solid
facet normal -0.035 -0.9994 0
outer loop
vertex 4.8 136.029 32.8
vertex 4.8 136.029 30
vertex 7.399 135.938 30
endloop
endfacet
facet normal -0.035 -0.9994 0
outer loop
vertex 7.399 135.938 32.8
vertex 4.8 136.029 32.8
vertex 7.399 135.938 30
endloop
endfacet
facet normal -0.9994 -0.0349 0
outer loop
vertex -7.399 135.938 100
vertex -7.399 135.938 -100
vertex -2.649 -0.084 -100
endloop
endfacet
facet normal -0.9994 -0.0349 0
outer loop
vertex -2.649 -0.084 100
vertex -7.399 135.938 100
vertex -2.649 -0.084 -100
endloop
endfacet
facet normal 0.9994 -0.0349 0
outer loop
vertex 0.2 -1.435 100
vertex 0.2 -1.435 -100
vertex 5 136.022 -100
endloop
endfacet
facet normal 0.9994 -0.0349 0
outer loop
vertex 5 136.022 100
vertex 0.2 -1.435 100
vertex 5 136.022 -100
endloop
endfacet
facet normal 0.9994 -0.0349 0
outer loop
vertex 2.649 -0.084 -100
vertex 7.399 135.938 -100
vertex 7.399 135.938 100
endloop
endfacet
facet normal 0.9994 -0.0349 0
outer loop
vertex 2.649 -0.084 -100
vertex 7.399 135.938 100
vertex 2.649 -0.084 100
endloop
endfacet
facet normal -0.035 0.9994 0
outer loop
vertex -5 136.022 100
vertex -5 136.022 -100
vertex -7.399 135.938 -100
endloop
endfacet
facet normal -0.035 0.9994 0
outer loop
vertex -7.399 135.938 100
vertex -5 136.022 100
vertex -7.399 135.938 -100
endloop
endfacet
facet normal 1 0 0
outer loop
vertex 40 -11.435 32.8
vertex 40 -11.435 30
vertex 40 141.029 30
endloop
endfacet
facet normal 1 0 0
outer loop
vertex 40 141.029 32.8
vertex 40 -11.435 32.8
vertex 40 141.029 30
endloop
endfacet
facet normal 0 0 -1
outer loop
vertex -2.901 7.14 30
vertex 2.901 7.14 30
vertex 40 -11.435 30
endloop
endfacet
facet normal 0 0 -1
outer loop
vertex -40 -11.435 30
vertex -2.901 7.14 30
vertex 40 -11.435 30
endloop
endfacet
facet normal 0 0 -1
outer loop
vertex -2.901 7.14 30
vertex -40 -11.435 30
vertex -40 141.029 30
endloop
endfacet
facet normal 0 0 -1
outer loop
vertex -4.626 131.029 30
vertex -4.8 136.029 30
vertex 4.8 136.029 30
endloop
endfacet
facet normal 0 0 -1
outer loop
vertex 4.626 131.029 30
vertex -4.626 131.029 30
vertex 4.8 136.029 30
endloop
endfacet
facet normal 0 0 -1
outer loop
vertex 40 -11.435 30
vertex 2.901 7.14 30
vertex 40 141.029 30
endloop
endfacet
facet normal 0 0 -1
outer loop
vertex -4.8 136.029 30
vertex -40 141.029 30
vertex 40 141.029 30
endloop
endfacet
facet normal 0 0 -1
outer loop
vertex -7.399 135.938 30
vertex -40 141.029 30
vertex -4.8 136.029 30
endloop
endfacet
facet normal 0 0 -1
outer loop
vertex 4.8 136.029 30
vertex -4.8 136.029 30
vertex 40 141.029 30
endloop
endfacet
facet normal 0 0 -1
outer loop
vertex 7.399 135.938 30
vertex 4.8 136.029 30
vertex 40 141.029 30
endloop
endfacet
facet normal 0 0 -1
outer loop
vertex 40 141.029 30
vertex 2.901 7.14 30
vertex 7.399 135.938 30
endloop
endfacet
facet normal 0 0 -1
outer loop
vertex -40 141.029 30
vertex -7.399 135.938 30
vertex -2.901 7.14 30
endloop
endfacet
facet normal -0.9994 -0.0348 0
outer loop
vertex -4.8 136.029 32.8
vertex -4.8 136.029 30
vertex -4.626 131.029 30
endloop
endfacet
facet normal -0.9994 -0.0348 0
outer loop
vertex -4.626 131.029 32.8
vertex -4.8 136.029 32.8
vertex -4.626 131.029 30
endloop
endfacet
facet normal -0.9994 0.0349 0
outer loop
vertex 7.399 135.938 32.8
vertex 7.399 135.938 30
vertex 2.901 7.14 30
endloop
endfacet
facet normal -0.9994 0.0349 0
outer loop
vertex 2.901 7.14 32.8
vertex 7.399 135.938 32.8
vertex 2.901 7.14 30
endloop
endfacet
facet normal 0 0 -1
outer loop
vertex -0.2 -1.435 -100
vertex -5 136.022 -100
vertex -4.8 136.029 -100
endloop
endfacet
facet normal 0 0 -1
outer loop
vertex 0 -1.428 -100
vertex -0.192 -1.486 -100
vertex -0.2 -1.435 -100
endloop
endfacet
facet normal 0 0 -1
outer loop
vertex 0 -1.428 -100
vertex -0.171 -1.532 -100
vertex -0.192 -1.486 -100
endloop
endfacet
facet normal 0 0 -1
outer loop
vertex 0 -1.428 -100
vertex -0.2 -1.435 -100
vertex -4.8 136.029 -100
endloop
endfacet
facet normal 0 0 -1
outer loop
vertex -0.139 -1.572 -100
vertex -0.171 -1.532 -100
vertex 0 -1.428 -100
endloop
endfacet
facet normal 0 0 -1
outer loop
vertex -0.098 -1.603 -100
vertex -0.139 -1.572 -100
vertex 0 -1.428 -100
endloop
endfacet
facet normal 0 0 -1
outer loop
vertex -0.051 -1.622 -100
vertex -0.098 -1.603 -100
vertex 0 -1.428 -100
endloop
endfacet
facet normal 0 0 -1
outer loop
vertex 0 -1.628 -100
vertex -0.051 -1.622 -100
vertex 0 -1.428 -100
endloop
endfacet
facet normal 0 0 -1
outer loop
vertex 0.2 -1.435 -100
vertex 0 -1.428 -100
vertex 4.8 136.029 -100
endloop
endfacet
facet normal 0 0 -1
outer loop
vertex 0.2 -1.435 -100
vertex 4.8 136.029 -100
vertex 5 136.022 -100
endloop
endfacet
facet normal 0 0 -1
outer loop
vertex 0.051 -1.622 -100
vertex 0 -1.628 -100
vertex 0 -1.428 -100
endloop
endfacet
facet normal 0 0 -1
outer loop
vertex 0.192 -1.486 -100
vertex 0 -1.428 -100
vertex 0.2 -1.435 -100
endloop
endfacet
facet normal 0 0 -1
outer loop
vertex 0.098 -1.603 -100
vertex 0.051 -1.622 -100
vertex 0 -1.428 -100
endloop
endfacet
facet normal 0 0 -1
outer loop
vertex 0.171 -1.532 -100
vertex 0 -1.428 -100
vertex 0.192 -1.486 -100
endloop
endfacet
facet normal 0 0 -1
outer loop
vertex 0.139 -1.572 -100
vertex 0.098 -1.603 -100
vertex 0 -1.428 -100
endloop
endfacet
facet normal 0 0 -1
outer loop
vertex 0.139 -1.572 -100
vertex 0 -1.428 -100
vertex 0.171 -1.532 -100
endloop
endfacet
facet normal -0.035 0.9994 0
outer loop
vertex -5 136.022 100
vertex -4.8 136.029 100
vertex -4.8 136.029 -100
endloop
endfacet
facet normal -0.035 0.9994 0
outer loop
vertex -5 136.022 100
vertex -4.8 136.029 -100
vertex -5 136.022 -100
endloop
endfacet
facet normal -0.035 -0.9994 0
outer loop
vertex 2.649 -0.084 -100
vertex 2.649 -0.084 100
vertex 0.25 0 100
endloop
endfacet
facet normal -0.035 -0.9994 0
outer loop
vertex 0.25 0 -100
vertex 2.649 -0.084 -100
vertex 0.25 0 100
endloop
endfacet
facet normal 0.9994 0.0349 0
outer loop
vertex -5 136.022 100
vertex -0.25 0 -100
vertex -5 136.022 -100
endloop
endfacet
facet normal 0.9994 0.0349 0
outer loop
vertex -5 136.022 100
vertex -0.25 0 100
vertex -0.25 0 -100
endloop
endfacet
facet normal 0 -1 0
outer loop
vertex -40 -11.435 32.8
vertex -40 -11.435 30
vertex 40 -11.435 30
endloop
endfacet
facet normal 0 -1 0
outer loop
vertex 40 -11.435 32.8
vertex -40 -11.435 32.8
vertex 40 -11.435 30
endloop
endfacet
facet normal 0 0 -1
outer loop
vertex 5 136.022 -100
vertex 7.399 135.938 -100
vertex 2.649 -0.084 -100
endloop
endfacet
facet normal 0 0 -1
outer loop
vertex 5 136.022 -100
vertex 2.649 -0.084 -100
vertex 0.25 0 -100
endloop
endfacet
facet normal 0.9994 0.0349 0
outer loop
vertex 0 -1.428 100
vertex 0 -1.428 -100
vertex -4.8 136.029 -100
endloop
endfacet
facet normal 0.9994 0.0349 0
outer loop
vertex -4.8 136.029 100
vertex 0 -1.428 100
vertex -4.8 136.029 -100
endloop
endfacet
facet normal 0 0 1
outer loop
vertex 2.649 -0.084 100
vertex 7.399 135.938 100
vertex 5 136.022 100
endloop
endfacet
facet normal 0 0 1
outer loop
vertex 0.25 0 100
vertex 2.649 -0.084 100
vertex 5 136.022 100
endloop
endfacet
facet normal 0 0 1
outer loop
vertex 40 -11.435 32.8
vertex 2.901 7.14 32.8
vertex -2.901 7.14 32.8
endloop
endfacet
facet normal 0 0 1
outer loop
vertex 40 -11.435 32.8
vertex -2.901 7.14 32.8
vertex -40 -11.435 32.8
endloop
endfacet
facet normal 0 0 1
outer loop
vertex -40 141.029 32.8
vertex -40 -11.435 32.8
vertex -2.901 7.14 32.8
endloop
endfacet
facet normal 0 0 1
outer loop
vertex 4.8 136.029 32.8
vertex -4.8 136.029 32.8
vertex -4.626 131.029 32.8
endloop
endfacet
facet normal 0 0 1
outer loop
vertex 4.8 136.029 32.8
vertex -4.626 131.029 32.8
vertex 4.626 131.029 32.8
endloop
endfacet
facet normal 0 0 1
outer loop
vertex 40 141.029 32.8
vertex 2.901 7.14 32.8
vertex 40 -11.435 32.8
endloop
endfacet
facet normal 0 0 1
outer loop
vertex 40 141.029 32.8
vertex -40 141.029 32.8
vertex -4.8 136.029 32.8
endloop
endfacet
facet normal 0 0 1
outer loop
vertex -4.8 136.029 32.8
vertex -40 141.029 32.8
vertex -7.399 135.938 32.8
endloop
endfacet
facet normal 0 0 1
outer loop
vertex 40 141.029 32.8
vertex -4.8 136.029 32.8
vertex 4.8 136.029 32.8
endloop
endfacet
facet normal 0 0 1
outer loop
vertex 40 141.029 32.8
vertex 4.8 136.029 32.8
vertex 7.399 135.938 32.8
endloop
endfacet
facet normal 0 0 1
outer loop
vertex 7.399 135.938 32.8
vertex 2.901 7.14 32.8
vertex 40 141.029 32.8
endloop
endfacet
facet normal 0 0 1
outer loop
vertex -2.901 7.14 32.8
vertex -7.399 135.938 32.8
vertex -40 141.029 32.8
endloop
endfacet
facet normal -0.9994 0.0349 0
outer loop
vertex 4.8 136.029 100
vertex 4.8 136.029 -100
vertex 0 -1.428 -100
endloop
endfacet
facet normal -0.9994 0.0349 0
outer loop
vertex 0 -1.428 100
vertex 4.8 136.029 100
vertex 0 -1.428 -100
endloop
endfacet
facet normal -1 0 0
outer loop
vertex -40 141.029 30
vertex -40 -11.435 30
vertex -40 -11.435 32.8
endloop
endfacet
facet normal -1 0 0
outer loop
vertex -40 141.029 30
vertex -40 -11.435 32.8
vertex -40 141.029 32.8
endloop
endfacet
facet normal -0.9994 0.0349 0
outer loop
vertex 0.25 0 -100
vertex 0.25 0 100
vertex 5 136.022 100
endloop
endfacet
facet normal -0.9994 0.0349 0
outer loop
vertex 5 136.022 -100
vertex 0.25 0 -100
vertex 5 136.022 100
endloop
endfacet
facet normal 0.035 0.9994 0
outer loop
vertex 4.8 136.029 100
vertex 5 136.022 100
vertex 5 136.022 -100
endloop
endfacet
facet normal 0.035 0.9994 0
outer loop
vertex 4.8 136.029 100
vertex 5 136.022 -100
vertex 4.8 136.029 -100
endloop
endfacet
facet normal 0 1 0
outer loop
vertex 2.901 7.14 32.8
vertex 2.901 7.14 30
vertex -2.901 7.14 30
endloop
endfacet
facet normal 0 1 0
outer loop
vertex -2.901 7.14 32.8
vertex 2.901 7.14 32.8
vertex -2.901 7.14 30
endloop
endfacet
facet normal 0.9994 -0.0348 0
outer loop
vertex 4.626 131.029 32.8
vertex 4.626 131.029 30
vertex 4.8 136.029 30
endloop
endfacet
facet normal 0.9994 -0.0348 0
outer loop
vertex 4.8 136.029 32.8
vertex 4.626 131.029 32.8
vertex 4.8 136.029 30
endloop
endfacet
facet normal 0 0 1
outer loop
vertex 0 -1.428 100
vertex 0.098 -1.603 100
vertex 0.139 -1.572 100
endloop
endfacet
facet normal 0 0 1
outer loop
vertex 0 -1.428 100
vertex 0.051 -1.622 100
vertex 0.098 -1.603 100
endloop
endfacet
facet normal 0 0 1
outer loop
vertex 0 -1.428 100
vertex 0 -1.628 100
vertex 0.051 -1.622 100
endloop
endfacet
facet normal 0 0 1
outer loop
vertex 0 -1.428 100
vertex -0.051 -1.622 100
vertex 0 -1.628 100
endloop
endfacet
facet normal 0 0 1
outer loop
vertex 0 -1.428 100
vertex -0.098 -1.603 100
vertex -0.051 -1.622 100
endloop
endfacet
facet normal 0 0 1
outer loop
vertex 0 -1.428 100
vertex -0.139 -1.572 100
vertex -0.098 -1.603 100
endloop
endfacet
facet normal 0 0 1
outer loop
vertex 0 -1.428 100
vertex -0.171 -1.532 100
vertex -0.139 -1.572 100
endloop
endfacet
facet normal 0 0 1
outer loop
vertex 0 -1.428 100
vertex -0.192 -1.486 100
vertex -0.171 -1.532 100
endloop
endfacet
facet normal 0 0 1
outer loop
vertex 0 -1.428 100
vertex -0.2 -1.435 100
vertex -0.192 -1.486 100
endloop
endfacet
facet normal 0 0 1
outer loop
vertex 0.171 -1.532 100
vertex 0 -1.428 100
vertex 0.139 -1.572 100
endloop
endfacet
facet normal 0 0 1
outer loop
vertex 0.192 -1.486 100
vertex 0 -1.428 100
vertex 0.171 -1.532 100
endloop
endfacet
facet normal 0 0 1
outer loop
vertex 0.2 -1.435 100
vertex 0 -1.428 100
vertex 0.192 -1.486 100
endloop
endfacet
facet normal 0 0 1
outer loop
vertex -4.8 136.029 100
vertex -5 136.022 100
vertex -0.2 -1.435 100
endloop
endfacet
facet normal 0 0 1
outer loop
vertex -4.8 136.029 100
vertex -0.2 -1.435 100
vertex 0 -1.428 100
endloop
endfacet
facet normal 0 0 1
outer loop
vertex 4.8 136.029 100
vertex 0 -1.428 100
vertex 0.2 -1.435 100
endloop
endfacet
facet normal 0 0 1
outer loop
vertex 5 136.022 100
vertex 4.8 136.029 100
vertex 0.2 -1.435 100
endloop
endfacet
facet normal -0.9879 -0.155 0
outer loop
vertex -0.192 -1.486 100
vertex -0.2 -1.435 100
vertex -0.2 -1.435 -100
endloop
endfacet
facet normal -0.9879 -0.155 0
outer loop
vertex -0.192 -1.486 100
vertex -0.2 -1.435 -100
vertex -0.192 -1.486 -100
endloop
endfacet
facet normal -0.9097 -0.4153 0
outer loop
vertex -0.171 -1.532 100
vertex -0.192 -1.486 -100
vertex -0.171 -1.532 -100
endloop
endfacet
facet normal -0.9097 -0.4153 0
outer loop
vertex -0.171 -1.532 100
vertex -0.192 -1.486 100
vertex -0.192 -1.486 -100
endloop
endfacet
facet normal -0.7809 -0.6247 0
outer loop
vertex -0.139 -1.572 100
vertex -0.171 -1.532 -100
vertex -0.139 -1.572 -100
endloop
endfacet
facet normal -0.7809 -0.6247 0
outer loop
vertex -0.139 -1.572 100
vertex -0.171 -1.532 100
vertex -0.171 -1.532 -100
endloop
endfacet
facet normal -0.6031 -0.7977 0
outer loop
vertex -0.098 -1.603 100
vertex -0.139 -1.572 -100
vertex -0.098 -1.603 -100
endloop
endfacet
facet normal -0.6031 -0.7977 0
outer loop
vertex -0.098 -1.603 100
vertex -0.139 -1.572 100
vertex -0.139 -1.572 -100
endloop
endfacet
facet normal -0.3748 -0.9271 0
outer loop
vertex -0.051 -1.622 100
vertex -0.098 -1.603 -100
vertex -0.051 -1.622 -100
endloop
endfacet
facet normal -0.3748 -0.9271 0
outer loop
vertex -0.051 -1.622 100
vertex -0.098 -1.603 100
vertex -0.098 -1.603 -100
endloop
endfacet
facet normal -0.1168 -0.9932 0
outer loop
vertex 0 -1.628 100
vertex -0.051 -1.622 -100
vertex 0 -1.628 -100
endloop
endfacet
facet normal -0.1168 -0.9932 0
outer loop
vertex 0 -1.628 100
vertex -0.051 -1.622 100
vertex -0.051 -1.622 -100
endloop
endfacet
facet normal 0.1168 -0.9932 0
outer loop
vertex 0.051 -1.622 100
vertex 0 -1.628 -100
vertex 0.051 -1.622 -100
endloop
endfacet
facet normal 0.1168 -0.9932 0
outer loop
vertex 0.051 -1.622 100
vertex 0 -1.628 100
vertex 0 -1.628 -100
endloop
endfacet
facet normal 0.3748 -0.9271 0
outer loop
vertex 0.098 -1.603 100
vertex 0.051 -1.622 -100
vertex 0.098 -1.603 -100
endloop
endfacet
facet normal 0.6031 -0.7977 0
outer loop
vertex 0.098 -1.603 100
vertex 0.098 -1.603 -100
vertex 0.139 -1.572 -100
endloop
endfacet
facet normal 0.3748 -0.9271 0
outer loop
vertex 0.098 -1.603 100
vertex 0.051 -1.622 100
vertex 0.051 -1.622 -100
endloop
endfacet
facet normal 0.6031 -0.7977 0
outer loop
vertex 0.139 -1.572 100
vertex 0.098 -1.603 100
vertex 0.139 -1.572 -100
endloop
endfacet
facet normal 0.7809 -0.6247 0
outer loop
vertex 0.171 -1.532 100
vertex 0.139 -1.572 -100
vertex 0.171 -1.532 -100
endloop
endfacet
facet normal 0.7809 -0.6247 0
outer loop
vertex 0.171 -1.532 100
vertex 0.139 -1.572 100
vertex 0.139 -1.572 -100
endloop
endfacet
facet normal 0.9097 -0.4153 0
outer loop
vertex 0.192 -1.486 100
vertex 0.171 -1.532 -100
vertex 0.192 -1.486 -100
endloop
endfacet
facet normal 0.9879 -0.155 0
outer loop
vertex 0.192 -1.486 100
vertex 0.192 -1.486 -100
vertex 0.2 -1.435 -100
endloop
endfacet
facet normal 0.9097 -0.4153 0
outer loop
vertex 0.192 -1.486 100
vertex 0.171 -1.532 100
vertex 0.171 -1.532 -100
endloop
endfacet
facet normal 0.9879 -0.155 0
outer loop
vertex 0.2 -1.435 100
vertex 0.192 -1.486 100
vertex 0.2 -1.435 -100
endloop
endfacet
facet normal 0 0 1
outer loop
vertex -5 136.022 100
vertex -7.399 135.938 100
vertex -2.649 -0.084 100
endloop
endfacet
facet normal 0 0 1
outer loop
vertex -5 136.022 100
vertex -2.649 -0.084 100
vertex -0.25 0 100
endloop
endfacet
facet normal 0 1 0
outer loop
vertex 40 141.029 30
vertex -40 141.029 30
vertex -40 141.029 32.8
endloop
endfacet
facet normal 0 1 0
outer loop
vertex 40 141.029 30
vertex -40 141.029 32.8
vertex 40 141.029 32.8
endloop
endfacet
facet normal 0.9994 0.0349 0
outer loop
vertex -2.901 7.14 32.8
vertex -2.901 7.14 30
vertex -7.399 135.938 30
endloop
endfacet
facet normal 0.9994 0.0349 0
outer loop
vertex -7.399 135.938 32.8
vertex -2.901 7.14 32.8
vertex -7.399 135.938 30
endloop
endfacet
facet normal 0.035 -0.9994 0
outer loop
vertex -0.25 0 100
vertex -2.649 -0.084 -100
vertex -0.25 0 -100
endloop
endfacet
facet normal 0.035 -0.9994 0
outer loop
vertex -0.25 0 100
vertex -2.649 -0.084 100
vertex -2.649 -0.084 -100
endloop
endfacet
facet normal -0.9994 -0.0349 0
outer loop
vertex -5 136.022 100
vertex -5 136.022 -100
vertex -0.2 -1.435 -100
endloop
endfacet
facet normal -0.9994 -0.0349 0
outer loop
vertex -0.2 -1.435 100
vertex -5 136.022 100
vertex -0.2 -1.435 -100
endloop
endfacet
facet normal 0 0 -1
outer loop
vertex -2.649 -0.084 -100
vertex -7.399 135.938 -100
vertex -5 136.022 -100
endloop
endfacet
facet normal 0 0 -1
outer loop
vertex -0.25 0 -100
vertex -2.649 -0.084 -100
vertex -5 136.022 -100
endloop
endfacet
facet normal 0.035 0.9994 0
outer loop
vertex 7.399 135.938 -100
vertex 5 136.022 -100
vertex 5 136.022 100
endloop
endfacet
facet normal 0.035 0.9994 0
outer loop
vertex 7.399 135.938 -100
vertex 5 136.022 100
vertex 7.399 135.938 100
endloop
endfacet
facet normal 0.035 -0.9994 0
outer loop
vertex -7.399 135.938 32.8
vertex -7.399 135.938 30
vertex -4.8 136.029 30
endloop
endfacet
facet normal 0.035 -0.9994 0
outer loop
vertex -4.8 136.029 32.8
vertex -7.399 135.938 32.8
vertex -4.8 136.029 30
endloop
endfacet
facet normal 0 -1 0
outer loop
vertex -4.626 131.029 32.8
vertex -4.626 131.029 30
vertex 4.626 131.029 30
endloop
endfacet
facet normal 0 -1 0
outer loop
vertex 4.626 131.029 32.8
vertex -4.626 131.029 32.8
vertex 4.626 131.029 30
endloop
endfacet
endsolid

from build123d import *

# Parameters (mm, degrees)
BOSS_EXTRUDE1_DEPTH             = 100
BOSS_EXTRUDE1_2_DEPTH           = 100
BOSS_EXTRUDE2_REACH             = 170.988
BOSS_EXTRUDE2_DIRECTION_2_REACH = 170.988
SKETCH5_W                       = 80
SKETCH5_H                       = 152.464323179
BOSS_EXTRUDE3_DEPTH             = 2.8


with BuildPart() as part:
    # Sketch2 → Boss-Extrude1 (new, symmetric)
    with BuildSketch(Plane.XY):
        Polygon((-0.25, 0), (-5, 136.022203094), (-7.398537985, 135.938444302), (-2.648537985, -0.083758792), align=None)
    extrude(amount=BOSS_EXTRUDE1_DEPTH, both=True)


with BuildPart() as body_2:
    # Sketch2 → Boss-Extrude1 2 (new, symmetric)
    with BuildSketch(Plane.XY):
        Polygon((0.25, 0), (5, 136.022203094), (7.398537985, 135.938444302), (2.648537985, -0.083758792), align=None)
    extrude(amount=BOSS_EXTRUDE1_2_DEPTH, both=True)


with BuildPart() as body_3:

    # Boss-Extrude2: up to this face of the body (flat: up to its plane)
    boss_extrude2_end = Plane(part.part.faces().sort_by_distance((-3.824268992, 67.969222151, 100))[0])
    # Sketch4 → Boss-Extrude2 (new, up to the picked face)
    with BuildSketch(Plane.XY, mode=Mode.PRIVATE) as boss_extrude2_sk1:
        with BuildLine():
            Line((-5, 136.022203094), (-0.199878165, -1.43530155))
            ThreePointArc((-0.199878165, -1.43530155), (0, -1.628321651), (0.199878165, -1.43530155))
            Line((0.199878165, -1.43530155), (5, 136.022203094))
            Line((5, 136.022203094), (4.800121835, 136.029182993))
            Line((4.800121835, 136.029182993), (0, -1.428321651))
            Line((0, -1.428321651), (-4.800121835, 136.029182993))
            Line((-4.800121835, 136.029182993), (-5, 136.022203094))
        make_face()
    boss_extrude2_tool1 = split(extrude(boss_extrude2_sk1.sketch, amount=BOSS_EXTRUDE2_REACH, mode=Mode.PRIVATE), bisect_by=boss_extrude2_end, keep=Keep.BOTH, mode=Mode.PRIVATE)
    add(boss_extrude2_tool1.solids().sort_by(Axis((2.462003, 67.298268, 0), (0, 0, 1)))[0])


    # Boss-Extrude2 direction 2: up to this face of the body (flat: up to its plane)
    boss_extrude2_direction_2_end = Plane(part.part.faces().sort_by_distance((-3.824268992, 67.969222151, -100))[0])
    # Sketch4 → Boss-Extrude2 direction 2 (add, up to the picked face)
    with BuildSketch(Plane.XY, mode=Mode.PRIVATE) as boss_extrude2_direction_2_sk1:
        with BuildLine():
            Line((-5, 136.022203094), (-0.199878165, -1.43530155))
            ThreePointArc((-0.199878165, -1.43530155), (0, -1.628321651), (0.199878165, -1.43530155))
            Line((0.199878165, -1.43530155), (5, 136.022203094))
            Line((5, 136.022203094), (4.800121835, 136.029182993))
            Line((4.800121835, 136.029182993), (0, -1.428321651))
            Line((0, -1.428321651), (-4.800121835, 136.029182993))
            Line((-4.800121835, 136.029182993), (-5, 136.022203094))
        make_face()
    boss_extrude2_direction_2_tool1 = split(extrude(boss_extrude2_direction_2_sk1.sketch, amount=-BOSS_EXTRUDE2_DIRECTION_2_REACH, mode=Mode.PRIVATE), bisect_by=boss_extrude2_direction_2_end, keep=Keep.BOTH, mode=Mode.PRIVATE)
    add(boss_extrude2_direction_2_tool1.solids().sort_by(Axis((2.462003, 67.298268, 0), (0, 0, -1)))[0])


with BuildPart() as body_4:
    # Sketch5 → Boss-Extrude3 (new body)
    with BuildSketch(Plane.XY.offset(30)):
        with Locations((0, 64.797021403)):
            Rectangle(SKETCH5_W, SKETCH5_H)
        Polygon((-4.800121835, 136.029182993), (-4.625517987, 131.029182993), (4.625517987, 131.029182993), (4.800121835, 136.029182993), (7.398537985, 135.938444302), (2.900792305, 7.139859814), (-2.900792305, 7.139859814), (-7.398537985, 135.938444302), align=None, mode=Mode.SUBTRACT)
    extrude(amount=BOSS_EXTRUDE3_DEPTH)


solid = Compound([part.part, body_2.part, body_3.part, body_4.part])
